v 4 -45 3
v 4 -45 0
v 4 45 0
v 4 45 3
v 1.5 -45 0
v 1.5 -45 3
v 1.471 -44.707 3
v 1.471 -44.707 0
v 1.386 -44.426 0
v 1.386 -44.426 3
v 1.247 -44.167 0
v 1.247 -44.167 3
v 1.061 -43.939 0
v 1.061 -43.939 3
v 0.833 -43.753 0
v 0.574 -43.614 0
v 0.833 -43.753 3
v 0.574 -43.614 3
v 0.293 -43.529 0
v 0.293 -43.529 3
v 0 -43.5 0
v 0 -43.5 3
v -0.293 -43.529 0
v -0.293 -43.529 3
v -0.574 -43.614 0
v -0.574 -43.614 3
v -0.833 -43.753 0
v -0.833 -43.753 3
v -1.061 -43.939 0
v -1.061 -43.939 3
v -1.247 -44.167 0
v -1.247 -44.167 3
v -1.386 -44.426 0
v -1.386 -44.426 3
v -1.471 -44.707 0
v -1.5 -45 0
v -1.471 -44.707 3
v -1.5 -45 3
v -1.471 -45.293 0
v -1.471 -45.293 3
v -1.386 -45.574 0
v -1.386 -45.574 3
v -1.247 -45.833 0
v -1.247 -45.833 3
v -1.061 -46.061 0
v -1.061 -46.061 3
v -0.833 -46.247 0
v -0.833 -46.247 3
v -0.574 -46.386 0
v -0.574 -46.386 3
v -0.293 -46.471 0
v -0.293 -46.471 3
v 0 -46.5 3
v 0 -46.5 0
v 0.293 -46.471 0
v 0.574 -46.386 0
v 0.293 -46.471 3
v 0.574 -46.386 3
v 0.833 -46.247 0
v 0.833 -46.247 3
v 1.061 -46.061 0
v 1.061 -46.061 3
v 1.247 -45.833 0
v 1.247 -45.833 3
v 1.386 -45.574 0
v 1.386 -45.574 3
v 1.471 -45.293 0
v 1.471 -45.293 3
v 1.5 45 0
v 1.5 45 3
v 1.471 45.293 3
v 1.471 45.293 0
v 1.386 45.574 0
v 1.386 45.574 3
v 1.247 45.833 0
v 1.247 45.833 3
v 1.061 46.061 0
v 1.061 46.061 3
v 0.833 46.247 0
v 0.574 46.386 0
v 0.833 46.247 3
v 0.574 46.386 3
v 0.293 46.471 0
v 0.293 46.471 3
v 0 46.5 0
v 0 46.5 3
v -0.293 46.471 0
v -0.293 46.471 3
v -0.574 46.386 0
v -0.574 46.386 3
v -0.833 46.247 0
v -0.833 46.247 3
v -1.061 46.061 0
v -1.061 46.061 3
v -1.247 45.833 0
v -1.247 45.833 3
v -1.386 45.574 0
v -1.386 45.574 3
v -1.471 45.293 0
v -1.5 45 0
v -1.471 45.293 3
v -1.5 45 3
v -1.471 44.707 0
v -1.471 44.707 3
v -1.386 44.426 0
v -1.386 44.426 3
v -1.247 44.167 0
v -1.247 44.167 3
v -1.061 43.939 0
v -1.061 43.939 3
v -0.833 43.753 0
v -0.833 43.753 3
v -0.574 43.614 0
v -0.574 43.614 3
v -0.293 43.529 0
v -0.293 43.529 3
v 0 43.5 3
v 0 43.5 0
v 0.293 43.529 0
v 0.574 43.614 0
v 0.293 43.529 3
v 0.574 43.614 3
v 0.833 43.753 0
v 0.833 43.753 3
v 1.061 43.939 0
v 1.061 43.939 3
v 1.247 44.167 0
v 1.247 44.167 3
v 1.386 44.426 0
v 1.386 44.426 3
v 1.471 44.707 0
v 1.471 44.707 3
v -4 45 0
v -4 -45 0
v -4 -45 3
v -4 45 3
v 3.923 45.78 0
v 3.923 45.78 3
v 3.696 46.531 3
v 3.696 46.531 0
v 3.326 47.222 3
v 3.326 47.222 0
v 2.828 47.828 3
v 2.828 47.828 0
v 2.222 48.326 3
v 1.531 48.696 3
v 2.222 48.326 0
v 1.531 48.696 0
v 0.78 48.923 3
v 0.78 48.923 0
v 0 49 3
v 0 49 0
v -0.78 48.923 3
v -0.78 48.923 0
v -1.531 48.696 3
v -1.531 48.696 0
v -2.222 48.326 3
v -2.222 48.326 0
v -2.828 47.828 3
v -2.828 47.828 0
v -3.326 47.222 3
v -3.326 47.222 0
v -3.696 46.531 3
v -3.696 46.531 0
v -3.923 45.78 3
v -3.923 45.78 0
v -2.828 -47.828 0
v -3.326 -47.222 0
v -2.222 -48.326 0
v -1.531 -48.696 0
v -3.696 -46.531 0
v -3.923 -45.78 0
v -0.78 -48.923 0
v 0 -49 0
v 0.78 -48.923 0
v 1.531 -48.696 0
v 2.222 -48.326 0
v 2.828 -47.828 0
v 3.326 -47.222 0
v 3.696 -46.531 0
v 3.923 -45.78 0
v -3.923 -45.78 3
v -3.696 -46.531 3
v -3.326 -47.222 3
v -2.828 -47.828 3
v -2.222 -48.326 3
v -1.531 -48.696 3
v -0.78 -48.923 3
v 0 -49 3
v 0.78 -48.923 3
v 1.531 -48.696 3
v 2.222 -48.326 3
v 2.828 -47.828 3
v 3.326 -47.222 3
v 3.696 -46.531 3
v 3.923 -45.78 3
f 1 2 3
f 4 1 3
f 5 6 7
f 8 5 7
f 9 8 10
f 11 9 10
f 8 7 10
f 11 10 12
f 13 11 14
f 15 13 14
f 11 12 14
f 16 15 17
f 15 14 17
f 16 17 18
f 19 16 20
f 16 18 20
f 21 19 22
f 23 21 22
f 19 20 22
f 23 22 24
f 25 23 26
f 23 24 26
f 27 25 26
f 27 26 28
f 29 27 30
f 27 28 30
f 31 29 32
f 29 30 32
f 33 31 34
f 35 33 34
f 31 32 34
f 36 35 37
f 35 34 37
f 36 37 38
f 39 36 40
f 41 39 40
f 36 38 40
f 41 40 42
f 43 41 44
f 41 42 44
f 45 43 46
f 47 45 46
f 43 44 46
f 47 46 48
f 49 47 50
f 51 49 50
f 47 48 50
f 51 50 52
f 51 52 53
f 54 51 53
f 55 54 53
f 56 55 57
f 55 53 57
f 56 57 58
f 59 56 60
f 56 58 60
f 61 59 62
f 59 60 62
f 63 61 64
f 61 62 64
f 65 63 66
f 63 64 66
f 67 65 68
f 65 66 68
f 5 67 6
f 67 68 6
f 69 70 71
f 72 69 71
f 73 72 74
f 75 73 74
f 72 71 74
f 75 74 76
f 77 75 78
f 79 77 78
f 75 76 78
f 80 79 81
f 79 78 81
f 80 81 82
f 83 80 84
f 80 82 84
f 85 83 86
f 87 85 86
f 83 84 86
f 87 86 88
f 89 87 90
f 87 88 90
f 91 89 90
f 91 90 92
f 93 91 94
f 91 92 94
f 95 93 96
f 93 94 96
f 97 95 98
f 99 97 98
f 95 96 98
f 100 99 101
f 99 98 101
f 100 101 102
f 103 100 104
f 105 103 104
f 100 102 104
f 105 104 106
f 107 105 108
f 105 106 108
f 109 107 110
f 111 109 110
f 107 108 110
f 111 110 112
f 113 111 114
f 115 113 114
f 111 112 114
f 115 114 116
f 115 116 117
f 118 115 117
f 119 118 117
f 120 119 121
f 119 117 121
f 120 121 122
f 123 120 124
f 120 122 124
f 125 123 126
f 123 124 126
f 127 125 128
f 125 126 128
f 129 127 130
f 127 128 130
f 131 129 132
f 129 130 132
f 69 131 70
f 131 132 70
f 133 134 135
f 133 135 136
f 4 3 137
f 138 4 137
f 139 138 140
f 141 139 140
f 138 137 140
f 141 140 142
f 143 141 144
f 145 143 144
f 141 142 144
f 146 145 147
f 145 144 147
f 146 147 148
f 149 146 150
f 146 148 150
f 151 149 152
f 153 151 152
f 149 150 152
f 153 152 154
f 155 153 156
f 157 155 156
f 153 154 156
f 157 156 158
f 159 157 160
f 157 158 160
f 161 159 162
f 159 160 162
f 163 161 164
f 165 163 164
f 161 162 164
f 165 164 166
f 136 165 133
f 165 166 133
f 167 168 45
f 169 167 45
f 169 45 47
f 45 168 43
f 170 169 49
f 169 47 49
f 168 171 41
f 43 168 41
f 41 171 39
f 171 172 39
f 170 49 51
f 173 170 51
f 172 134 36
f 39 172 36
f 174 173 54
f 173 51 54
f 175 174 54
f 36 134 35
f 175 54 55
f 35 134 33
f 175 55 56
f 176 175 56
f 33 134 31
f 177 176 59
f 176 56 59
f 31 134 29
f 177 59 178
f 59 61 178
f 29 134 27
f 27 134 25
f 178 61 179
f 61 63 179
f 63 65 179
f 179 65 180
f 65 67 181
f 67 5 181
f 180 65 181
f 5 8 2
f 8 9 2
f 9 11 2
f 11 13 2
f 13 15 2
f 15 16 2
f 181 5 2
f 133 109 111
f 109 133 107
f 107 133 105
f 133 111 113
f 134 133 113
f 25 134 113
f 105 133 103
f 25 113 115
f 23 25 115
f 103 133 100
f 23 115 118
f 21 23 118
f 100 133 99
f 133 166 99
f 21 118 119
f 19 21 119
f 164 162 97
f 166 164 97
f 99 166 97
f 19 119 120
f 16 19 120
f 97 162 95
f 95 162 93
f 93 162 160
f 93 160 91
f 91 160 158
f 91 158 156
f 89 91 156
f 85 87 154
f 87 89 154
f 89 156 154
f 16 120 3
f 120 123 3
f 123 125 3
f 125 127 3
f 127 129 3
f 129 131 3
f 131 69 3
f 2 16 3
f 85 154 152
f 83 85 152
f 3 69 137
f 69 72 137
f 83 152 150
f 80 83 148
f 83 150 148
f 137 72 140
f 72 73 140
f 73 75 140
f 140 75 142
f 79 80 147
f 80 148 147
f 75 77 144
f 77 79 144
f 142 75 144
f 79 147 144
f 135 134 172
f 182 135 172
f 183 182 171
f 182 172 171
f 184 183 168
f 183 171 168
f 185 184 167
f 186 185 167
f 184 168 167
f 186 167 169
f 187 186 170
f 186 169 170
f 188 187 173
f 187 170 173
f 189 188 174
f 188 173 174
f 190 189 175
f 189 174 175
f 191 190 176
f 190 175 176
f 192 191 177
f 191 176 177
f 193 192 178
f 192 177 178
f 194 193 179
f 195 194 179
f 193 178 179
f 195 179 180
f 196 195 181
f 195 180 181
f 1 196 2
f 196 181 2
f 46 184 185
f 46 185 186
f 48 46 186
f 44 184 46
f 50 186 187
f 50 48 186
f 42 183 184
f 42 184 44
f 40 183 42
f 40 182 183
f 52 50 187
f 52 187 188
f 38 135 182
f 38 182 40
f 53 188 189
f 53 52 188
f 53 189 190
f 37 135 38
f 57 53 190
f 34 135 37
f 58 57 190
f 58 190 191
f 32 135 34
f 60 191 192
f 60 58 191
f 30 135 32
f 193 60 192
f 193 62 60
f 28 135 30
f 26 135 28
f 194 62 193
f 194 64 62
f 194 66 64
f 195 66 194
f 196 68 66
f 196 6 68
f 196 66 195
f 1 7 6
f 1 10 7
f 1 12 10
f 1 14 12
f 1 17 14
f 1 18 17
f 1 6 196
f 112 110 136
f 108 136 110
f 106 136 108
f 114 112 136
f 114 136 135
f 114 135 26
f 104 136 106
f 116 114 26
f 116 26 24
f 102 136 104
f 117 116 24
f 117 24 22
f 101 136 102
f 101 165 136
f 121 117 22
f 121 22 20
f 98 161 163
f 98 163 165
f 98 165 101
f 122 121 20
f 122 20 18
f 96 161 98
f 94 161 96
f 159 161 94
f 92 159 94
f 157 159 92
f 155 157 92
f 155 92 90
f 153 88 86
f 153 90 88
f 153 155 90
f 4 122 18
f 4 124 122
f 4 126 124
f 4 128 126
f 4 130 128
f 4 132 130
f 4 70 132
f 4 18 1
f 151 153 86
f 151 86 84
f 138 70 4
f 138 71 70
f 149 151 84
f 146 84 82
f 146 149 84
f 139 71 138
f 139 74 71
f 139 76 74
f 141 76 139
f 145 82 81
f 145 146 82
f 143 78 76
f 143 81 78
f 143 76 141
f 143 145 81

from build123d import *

# Parameters (mm, degrees)
SKETCH_1_W          = 8
SKETCH_1_H          = 90
EXTRUDE_1_DEPTH     = 3
SKETCH_2_R          = 4
EXTRUDE_2_DEPTH     = 3
SKETCH_3_R          = 1.5
CUT_EXTRUDE_1_DEPTH = 3


with BuildPart() as part:
    # 草图1 → 凸台-拉伸1 (new body)
    with BuildSketch(Plane.XY):
        Rectangle(SKETCH_1_W, SKETCH_1_H)
    extrude(amount=EXTRUDE_1_DEPTH)

    # 草图2 → 凸台-拉伸2 (add)
    with BuildSketch(Plane.XY):
        with Locations((0, 45)):
            Circle(SKETCH_2_R)
        with Locations((0, -45)):
            Circle(SKETCH_2_R)
    extrude(amount=EXTRUDE_2_DEPTH)

    # 草图3 → 切除-拉伸1 (cut)
    with BuildSketch(Plane.XY.offset(3)):
        with Locations((0, 45)):
            Circle(SKETCH_3_R)
        with Locations((0, -45)):
            Circle(SKETCH_3_R)
    extrude(amount=-CUT_EXTRUDE_1_DEPTH, mode=Mode.SUBTRACT)


solid = part.part
